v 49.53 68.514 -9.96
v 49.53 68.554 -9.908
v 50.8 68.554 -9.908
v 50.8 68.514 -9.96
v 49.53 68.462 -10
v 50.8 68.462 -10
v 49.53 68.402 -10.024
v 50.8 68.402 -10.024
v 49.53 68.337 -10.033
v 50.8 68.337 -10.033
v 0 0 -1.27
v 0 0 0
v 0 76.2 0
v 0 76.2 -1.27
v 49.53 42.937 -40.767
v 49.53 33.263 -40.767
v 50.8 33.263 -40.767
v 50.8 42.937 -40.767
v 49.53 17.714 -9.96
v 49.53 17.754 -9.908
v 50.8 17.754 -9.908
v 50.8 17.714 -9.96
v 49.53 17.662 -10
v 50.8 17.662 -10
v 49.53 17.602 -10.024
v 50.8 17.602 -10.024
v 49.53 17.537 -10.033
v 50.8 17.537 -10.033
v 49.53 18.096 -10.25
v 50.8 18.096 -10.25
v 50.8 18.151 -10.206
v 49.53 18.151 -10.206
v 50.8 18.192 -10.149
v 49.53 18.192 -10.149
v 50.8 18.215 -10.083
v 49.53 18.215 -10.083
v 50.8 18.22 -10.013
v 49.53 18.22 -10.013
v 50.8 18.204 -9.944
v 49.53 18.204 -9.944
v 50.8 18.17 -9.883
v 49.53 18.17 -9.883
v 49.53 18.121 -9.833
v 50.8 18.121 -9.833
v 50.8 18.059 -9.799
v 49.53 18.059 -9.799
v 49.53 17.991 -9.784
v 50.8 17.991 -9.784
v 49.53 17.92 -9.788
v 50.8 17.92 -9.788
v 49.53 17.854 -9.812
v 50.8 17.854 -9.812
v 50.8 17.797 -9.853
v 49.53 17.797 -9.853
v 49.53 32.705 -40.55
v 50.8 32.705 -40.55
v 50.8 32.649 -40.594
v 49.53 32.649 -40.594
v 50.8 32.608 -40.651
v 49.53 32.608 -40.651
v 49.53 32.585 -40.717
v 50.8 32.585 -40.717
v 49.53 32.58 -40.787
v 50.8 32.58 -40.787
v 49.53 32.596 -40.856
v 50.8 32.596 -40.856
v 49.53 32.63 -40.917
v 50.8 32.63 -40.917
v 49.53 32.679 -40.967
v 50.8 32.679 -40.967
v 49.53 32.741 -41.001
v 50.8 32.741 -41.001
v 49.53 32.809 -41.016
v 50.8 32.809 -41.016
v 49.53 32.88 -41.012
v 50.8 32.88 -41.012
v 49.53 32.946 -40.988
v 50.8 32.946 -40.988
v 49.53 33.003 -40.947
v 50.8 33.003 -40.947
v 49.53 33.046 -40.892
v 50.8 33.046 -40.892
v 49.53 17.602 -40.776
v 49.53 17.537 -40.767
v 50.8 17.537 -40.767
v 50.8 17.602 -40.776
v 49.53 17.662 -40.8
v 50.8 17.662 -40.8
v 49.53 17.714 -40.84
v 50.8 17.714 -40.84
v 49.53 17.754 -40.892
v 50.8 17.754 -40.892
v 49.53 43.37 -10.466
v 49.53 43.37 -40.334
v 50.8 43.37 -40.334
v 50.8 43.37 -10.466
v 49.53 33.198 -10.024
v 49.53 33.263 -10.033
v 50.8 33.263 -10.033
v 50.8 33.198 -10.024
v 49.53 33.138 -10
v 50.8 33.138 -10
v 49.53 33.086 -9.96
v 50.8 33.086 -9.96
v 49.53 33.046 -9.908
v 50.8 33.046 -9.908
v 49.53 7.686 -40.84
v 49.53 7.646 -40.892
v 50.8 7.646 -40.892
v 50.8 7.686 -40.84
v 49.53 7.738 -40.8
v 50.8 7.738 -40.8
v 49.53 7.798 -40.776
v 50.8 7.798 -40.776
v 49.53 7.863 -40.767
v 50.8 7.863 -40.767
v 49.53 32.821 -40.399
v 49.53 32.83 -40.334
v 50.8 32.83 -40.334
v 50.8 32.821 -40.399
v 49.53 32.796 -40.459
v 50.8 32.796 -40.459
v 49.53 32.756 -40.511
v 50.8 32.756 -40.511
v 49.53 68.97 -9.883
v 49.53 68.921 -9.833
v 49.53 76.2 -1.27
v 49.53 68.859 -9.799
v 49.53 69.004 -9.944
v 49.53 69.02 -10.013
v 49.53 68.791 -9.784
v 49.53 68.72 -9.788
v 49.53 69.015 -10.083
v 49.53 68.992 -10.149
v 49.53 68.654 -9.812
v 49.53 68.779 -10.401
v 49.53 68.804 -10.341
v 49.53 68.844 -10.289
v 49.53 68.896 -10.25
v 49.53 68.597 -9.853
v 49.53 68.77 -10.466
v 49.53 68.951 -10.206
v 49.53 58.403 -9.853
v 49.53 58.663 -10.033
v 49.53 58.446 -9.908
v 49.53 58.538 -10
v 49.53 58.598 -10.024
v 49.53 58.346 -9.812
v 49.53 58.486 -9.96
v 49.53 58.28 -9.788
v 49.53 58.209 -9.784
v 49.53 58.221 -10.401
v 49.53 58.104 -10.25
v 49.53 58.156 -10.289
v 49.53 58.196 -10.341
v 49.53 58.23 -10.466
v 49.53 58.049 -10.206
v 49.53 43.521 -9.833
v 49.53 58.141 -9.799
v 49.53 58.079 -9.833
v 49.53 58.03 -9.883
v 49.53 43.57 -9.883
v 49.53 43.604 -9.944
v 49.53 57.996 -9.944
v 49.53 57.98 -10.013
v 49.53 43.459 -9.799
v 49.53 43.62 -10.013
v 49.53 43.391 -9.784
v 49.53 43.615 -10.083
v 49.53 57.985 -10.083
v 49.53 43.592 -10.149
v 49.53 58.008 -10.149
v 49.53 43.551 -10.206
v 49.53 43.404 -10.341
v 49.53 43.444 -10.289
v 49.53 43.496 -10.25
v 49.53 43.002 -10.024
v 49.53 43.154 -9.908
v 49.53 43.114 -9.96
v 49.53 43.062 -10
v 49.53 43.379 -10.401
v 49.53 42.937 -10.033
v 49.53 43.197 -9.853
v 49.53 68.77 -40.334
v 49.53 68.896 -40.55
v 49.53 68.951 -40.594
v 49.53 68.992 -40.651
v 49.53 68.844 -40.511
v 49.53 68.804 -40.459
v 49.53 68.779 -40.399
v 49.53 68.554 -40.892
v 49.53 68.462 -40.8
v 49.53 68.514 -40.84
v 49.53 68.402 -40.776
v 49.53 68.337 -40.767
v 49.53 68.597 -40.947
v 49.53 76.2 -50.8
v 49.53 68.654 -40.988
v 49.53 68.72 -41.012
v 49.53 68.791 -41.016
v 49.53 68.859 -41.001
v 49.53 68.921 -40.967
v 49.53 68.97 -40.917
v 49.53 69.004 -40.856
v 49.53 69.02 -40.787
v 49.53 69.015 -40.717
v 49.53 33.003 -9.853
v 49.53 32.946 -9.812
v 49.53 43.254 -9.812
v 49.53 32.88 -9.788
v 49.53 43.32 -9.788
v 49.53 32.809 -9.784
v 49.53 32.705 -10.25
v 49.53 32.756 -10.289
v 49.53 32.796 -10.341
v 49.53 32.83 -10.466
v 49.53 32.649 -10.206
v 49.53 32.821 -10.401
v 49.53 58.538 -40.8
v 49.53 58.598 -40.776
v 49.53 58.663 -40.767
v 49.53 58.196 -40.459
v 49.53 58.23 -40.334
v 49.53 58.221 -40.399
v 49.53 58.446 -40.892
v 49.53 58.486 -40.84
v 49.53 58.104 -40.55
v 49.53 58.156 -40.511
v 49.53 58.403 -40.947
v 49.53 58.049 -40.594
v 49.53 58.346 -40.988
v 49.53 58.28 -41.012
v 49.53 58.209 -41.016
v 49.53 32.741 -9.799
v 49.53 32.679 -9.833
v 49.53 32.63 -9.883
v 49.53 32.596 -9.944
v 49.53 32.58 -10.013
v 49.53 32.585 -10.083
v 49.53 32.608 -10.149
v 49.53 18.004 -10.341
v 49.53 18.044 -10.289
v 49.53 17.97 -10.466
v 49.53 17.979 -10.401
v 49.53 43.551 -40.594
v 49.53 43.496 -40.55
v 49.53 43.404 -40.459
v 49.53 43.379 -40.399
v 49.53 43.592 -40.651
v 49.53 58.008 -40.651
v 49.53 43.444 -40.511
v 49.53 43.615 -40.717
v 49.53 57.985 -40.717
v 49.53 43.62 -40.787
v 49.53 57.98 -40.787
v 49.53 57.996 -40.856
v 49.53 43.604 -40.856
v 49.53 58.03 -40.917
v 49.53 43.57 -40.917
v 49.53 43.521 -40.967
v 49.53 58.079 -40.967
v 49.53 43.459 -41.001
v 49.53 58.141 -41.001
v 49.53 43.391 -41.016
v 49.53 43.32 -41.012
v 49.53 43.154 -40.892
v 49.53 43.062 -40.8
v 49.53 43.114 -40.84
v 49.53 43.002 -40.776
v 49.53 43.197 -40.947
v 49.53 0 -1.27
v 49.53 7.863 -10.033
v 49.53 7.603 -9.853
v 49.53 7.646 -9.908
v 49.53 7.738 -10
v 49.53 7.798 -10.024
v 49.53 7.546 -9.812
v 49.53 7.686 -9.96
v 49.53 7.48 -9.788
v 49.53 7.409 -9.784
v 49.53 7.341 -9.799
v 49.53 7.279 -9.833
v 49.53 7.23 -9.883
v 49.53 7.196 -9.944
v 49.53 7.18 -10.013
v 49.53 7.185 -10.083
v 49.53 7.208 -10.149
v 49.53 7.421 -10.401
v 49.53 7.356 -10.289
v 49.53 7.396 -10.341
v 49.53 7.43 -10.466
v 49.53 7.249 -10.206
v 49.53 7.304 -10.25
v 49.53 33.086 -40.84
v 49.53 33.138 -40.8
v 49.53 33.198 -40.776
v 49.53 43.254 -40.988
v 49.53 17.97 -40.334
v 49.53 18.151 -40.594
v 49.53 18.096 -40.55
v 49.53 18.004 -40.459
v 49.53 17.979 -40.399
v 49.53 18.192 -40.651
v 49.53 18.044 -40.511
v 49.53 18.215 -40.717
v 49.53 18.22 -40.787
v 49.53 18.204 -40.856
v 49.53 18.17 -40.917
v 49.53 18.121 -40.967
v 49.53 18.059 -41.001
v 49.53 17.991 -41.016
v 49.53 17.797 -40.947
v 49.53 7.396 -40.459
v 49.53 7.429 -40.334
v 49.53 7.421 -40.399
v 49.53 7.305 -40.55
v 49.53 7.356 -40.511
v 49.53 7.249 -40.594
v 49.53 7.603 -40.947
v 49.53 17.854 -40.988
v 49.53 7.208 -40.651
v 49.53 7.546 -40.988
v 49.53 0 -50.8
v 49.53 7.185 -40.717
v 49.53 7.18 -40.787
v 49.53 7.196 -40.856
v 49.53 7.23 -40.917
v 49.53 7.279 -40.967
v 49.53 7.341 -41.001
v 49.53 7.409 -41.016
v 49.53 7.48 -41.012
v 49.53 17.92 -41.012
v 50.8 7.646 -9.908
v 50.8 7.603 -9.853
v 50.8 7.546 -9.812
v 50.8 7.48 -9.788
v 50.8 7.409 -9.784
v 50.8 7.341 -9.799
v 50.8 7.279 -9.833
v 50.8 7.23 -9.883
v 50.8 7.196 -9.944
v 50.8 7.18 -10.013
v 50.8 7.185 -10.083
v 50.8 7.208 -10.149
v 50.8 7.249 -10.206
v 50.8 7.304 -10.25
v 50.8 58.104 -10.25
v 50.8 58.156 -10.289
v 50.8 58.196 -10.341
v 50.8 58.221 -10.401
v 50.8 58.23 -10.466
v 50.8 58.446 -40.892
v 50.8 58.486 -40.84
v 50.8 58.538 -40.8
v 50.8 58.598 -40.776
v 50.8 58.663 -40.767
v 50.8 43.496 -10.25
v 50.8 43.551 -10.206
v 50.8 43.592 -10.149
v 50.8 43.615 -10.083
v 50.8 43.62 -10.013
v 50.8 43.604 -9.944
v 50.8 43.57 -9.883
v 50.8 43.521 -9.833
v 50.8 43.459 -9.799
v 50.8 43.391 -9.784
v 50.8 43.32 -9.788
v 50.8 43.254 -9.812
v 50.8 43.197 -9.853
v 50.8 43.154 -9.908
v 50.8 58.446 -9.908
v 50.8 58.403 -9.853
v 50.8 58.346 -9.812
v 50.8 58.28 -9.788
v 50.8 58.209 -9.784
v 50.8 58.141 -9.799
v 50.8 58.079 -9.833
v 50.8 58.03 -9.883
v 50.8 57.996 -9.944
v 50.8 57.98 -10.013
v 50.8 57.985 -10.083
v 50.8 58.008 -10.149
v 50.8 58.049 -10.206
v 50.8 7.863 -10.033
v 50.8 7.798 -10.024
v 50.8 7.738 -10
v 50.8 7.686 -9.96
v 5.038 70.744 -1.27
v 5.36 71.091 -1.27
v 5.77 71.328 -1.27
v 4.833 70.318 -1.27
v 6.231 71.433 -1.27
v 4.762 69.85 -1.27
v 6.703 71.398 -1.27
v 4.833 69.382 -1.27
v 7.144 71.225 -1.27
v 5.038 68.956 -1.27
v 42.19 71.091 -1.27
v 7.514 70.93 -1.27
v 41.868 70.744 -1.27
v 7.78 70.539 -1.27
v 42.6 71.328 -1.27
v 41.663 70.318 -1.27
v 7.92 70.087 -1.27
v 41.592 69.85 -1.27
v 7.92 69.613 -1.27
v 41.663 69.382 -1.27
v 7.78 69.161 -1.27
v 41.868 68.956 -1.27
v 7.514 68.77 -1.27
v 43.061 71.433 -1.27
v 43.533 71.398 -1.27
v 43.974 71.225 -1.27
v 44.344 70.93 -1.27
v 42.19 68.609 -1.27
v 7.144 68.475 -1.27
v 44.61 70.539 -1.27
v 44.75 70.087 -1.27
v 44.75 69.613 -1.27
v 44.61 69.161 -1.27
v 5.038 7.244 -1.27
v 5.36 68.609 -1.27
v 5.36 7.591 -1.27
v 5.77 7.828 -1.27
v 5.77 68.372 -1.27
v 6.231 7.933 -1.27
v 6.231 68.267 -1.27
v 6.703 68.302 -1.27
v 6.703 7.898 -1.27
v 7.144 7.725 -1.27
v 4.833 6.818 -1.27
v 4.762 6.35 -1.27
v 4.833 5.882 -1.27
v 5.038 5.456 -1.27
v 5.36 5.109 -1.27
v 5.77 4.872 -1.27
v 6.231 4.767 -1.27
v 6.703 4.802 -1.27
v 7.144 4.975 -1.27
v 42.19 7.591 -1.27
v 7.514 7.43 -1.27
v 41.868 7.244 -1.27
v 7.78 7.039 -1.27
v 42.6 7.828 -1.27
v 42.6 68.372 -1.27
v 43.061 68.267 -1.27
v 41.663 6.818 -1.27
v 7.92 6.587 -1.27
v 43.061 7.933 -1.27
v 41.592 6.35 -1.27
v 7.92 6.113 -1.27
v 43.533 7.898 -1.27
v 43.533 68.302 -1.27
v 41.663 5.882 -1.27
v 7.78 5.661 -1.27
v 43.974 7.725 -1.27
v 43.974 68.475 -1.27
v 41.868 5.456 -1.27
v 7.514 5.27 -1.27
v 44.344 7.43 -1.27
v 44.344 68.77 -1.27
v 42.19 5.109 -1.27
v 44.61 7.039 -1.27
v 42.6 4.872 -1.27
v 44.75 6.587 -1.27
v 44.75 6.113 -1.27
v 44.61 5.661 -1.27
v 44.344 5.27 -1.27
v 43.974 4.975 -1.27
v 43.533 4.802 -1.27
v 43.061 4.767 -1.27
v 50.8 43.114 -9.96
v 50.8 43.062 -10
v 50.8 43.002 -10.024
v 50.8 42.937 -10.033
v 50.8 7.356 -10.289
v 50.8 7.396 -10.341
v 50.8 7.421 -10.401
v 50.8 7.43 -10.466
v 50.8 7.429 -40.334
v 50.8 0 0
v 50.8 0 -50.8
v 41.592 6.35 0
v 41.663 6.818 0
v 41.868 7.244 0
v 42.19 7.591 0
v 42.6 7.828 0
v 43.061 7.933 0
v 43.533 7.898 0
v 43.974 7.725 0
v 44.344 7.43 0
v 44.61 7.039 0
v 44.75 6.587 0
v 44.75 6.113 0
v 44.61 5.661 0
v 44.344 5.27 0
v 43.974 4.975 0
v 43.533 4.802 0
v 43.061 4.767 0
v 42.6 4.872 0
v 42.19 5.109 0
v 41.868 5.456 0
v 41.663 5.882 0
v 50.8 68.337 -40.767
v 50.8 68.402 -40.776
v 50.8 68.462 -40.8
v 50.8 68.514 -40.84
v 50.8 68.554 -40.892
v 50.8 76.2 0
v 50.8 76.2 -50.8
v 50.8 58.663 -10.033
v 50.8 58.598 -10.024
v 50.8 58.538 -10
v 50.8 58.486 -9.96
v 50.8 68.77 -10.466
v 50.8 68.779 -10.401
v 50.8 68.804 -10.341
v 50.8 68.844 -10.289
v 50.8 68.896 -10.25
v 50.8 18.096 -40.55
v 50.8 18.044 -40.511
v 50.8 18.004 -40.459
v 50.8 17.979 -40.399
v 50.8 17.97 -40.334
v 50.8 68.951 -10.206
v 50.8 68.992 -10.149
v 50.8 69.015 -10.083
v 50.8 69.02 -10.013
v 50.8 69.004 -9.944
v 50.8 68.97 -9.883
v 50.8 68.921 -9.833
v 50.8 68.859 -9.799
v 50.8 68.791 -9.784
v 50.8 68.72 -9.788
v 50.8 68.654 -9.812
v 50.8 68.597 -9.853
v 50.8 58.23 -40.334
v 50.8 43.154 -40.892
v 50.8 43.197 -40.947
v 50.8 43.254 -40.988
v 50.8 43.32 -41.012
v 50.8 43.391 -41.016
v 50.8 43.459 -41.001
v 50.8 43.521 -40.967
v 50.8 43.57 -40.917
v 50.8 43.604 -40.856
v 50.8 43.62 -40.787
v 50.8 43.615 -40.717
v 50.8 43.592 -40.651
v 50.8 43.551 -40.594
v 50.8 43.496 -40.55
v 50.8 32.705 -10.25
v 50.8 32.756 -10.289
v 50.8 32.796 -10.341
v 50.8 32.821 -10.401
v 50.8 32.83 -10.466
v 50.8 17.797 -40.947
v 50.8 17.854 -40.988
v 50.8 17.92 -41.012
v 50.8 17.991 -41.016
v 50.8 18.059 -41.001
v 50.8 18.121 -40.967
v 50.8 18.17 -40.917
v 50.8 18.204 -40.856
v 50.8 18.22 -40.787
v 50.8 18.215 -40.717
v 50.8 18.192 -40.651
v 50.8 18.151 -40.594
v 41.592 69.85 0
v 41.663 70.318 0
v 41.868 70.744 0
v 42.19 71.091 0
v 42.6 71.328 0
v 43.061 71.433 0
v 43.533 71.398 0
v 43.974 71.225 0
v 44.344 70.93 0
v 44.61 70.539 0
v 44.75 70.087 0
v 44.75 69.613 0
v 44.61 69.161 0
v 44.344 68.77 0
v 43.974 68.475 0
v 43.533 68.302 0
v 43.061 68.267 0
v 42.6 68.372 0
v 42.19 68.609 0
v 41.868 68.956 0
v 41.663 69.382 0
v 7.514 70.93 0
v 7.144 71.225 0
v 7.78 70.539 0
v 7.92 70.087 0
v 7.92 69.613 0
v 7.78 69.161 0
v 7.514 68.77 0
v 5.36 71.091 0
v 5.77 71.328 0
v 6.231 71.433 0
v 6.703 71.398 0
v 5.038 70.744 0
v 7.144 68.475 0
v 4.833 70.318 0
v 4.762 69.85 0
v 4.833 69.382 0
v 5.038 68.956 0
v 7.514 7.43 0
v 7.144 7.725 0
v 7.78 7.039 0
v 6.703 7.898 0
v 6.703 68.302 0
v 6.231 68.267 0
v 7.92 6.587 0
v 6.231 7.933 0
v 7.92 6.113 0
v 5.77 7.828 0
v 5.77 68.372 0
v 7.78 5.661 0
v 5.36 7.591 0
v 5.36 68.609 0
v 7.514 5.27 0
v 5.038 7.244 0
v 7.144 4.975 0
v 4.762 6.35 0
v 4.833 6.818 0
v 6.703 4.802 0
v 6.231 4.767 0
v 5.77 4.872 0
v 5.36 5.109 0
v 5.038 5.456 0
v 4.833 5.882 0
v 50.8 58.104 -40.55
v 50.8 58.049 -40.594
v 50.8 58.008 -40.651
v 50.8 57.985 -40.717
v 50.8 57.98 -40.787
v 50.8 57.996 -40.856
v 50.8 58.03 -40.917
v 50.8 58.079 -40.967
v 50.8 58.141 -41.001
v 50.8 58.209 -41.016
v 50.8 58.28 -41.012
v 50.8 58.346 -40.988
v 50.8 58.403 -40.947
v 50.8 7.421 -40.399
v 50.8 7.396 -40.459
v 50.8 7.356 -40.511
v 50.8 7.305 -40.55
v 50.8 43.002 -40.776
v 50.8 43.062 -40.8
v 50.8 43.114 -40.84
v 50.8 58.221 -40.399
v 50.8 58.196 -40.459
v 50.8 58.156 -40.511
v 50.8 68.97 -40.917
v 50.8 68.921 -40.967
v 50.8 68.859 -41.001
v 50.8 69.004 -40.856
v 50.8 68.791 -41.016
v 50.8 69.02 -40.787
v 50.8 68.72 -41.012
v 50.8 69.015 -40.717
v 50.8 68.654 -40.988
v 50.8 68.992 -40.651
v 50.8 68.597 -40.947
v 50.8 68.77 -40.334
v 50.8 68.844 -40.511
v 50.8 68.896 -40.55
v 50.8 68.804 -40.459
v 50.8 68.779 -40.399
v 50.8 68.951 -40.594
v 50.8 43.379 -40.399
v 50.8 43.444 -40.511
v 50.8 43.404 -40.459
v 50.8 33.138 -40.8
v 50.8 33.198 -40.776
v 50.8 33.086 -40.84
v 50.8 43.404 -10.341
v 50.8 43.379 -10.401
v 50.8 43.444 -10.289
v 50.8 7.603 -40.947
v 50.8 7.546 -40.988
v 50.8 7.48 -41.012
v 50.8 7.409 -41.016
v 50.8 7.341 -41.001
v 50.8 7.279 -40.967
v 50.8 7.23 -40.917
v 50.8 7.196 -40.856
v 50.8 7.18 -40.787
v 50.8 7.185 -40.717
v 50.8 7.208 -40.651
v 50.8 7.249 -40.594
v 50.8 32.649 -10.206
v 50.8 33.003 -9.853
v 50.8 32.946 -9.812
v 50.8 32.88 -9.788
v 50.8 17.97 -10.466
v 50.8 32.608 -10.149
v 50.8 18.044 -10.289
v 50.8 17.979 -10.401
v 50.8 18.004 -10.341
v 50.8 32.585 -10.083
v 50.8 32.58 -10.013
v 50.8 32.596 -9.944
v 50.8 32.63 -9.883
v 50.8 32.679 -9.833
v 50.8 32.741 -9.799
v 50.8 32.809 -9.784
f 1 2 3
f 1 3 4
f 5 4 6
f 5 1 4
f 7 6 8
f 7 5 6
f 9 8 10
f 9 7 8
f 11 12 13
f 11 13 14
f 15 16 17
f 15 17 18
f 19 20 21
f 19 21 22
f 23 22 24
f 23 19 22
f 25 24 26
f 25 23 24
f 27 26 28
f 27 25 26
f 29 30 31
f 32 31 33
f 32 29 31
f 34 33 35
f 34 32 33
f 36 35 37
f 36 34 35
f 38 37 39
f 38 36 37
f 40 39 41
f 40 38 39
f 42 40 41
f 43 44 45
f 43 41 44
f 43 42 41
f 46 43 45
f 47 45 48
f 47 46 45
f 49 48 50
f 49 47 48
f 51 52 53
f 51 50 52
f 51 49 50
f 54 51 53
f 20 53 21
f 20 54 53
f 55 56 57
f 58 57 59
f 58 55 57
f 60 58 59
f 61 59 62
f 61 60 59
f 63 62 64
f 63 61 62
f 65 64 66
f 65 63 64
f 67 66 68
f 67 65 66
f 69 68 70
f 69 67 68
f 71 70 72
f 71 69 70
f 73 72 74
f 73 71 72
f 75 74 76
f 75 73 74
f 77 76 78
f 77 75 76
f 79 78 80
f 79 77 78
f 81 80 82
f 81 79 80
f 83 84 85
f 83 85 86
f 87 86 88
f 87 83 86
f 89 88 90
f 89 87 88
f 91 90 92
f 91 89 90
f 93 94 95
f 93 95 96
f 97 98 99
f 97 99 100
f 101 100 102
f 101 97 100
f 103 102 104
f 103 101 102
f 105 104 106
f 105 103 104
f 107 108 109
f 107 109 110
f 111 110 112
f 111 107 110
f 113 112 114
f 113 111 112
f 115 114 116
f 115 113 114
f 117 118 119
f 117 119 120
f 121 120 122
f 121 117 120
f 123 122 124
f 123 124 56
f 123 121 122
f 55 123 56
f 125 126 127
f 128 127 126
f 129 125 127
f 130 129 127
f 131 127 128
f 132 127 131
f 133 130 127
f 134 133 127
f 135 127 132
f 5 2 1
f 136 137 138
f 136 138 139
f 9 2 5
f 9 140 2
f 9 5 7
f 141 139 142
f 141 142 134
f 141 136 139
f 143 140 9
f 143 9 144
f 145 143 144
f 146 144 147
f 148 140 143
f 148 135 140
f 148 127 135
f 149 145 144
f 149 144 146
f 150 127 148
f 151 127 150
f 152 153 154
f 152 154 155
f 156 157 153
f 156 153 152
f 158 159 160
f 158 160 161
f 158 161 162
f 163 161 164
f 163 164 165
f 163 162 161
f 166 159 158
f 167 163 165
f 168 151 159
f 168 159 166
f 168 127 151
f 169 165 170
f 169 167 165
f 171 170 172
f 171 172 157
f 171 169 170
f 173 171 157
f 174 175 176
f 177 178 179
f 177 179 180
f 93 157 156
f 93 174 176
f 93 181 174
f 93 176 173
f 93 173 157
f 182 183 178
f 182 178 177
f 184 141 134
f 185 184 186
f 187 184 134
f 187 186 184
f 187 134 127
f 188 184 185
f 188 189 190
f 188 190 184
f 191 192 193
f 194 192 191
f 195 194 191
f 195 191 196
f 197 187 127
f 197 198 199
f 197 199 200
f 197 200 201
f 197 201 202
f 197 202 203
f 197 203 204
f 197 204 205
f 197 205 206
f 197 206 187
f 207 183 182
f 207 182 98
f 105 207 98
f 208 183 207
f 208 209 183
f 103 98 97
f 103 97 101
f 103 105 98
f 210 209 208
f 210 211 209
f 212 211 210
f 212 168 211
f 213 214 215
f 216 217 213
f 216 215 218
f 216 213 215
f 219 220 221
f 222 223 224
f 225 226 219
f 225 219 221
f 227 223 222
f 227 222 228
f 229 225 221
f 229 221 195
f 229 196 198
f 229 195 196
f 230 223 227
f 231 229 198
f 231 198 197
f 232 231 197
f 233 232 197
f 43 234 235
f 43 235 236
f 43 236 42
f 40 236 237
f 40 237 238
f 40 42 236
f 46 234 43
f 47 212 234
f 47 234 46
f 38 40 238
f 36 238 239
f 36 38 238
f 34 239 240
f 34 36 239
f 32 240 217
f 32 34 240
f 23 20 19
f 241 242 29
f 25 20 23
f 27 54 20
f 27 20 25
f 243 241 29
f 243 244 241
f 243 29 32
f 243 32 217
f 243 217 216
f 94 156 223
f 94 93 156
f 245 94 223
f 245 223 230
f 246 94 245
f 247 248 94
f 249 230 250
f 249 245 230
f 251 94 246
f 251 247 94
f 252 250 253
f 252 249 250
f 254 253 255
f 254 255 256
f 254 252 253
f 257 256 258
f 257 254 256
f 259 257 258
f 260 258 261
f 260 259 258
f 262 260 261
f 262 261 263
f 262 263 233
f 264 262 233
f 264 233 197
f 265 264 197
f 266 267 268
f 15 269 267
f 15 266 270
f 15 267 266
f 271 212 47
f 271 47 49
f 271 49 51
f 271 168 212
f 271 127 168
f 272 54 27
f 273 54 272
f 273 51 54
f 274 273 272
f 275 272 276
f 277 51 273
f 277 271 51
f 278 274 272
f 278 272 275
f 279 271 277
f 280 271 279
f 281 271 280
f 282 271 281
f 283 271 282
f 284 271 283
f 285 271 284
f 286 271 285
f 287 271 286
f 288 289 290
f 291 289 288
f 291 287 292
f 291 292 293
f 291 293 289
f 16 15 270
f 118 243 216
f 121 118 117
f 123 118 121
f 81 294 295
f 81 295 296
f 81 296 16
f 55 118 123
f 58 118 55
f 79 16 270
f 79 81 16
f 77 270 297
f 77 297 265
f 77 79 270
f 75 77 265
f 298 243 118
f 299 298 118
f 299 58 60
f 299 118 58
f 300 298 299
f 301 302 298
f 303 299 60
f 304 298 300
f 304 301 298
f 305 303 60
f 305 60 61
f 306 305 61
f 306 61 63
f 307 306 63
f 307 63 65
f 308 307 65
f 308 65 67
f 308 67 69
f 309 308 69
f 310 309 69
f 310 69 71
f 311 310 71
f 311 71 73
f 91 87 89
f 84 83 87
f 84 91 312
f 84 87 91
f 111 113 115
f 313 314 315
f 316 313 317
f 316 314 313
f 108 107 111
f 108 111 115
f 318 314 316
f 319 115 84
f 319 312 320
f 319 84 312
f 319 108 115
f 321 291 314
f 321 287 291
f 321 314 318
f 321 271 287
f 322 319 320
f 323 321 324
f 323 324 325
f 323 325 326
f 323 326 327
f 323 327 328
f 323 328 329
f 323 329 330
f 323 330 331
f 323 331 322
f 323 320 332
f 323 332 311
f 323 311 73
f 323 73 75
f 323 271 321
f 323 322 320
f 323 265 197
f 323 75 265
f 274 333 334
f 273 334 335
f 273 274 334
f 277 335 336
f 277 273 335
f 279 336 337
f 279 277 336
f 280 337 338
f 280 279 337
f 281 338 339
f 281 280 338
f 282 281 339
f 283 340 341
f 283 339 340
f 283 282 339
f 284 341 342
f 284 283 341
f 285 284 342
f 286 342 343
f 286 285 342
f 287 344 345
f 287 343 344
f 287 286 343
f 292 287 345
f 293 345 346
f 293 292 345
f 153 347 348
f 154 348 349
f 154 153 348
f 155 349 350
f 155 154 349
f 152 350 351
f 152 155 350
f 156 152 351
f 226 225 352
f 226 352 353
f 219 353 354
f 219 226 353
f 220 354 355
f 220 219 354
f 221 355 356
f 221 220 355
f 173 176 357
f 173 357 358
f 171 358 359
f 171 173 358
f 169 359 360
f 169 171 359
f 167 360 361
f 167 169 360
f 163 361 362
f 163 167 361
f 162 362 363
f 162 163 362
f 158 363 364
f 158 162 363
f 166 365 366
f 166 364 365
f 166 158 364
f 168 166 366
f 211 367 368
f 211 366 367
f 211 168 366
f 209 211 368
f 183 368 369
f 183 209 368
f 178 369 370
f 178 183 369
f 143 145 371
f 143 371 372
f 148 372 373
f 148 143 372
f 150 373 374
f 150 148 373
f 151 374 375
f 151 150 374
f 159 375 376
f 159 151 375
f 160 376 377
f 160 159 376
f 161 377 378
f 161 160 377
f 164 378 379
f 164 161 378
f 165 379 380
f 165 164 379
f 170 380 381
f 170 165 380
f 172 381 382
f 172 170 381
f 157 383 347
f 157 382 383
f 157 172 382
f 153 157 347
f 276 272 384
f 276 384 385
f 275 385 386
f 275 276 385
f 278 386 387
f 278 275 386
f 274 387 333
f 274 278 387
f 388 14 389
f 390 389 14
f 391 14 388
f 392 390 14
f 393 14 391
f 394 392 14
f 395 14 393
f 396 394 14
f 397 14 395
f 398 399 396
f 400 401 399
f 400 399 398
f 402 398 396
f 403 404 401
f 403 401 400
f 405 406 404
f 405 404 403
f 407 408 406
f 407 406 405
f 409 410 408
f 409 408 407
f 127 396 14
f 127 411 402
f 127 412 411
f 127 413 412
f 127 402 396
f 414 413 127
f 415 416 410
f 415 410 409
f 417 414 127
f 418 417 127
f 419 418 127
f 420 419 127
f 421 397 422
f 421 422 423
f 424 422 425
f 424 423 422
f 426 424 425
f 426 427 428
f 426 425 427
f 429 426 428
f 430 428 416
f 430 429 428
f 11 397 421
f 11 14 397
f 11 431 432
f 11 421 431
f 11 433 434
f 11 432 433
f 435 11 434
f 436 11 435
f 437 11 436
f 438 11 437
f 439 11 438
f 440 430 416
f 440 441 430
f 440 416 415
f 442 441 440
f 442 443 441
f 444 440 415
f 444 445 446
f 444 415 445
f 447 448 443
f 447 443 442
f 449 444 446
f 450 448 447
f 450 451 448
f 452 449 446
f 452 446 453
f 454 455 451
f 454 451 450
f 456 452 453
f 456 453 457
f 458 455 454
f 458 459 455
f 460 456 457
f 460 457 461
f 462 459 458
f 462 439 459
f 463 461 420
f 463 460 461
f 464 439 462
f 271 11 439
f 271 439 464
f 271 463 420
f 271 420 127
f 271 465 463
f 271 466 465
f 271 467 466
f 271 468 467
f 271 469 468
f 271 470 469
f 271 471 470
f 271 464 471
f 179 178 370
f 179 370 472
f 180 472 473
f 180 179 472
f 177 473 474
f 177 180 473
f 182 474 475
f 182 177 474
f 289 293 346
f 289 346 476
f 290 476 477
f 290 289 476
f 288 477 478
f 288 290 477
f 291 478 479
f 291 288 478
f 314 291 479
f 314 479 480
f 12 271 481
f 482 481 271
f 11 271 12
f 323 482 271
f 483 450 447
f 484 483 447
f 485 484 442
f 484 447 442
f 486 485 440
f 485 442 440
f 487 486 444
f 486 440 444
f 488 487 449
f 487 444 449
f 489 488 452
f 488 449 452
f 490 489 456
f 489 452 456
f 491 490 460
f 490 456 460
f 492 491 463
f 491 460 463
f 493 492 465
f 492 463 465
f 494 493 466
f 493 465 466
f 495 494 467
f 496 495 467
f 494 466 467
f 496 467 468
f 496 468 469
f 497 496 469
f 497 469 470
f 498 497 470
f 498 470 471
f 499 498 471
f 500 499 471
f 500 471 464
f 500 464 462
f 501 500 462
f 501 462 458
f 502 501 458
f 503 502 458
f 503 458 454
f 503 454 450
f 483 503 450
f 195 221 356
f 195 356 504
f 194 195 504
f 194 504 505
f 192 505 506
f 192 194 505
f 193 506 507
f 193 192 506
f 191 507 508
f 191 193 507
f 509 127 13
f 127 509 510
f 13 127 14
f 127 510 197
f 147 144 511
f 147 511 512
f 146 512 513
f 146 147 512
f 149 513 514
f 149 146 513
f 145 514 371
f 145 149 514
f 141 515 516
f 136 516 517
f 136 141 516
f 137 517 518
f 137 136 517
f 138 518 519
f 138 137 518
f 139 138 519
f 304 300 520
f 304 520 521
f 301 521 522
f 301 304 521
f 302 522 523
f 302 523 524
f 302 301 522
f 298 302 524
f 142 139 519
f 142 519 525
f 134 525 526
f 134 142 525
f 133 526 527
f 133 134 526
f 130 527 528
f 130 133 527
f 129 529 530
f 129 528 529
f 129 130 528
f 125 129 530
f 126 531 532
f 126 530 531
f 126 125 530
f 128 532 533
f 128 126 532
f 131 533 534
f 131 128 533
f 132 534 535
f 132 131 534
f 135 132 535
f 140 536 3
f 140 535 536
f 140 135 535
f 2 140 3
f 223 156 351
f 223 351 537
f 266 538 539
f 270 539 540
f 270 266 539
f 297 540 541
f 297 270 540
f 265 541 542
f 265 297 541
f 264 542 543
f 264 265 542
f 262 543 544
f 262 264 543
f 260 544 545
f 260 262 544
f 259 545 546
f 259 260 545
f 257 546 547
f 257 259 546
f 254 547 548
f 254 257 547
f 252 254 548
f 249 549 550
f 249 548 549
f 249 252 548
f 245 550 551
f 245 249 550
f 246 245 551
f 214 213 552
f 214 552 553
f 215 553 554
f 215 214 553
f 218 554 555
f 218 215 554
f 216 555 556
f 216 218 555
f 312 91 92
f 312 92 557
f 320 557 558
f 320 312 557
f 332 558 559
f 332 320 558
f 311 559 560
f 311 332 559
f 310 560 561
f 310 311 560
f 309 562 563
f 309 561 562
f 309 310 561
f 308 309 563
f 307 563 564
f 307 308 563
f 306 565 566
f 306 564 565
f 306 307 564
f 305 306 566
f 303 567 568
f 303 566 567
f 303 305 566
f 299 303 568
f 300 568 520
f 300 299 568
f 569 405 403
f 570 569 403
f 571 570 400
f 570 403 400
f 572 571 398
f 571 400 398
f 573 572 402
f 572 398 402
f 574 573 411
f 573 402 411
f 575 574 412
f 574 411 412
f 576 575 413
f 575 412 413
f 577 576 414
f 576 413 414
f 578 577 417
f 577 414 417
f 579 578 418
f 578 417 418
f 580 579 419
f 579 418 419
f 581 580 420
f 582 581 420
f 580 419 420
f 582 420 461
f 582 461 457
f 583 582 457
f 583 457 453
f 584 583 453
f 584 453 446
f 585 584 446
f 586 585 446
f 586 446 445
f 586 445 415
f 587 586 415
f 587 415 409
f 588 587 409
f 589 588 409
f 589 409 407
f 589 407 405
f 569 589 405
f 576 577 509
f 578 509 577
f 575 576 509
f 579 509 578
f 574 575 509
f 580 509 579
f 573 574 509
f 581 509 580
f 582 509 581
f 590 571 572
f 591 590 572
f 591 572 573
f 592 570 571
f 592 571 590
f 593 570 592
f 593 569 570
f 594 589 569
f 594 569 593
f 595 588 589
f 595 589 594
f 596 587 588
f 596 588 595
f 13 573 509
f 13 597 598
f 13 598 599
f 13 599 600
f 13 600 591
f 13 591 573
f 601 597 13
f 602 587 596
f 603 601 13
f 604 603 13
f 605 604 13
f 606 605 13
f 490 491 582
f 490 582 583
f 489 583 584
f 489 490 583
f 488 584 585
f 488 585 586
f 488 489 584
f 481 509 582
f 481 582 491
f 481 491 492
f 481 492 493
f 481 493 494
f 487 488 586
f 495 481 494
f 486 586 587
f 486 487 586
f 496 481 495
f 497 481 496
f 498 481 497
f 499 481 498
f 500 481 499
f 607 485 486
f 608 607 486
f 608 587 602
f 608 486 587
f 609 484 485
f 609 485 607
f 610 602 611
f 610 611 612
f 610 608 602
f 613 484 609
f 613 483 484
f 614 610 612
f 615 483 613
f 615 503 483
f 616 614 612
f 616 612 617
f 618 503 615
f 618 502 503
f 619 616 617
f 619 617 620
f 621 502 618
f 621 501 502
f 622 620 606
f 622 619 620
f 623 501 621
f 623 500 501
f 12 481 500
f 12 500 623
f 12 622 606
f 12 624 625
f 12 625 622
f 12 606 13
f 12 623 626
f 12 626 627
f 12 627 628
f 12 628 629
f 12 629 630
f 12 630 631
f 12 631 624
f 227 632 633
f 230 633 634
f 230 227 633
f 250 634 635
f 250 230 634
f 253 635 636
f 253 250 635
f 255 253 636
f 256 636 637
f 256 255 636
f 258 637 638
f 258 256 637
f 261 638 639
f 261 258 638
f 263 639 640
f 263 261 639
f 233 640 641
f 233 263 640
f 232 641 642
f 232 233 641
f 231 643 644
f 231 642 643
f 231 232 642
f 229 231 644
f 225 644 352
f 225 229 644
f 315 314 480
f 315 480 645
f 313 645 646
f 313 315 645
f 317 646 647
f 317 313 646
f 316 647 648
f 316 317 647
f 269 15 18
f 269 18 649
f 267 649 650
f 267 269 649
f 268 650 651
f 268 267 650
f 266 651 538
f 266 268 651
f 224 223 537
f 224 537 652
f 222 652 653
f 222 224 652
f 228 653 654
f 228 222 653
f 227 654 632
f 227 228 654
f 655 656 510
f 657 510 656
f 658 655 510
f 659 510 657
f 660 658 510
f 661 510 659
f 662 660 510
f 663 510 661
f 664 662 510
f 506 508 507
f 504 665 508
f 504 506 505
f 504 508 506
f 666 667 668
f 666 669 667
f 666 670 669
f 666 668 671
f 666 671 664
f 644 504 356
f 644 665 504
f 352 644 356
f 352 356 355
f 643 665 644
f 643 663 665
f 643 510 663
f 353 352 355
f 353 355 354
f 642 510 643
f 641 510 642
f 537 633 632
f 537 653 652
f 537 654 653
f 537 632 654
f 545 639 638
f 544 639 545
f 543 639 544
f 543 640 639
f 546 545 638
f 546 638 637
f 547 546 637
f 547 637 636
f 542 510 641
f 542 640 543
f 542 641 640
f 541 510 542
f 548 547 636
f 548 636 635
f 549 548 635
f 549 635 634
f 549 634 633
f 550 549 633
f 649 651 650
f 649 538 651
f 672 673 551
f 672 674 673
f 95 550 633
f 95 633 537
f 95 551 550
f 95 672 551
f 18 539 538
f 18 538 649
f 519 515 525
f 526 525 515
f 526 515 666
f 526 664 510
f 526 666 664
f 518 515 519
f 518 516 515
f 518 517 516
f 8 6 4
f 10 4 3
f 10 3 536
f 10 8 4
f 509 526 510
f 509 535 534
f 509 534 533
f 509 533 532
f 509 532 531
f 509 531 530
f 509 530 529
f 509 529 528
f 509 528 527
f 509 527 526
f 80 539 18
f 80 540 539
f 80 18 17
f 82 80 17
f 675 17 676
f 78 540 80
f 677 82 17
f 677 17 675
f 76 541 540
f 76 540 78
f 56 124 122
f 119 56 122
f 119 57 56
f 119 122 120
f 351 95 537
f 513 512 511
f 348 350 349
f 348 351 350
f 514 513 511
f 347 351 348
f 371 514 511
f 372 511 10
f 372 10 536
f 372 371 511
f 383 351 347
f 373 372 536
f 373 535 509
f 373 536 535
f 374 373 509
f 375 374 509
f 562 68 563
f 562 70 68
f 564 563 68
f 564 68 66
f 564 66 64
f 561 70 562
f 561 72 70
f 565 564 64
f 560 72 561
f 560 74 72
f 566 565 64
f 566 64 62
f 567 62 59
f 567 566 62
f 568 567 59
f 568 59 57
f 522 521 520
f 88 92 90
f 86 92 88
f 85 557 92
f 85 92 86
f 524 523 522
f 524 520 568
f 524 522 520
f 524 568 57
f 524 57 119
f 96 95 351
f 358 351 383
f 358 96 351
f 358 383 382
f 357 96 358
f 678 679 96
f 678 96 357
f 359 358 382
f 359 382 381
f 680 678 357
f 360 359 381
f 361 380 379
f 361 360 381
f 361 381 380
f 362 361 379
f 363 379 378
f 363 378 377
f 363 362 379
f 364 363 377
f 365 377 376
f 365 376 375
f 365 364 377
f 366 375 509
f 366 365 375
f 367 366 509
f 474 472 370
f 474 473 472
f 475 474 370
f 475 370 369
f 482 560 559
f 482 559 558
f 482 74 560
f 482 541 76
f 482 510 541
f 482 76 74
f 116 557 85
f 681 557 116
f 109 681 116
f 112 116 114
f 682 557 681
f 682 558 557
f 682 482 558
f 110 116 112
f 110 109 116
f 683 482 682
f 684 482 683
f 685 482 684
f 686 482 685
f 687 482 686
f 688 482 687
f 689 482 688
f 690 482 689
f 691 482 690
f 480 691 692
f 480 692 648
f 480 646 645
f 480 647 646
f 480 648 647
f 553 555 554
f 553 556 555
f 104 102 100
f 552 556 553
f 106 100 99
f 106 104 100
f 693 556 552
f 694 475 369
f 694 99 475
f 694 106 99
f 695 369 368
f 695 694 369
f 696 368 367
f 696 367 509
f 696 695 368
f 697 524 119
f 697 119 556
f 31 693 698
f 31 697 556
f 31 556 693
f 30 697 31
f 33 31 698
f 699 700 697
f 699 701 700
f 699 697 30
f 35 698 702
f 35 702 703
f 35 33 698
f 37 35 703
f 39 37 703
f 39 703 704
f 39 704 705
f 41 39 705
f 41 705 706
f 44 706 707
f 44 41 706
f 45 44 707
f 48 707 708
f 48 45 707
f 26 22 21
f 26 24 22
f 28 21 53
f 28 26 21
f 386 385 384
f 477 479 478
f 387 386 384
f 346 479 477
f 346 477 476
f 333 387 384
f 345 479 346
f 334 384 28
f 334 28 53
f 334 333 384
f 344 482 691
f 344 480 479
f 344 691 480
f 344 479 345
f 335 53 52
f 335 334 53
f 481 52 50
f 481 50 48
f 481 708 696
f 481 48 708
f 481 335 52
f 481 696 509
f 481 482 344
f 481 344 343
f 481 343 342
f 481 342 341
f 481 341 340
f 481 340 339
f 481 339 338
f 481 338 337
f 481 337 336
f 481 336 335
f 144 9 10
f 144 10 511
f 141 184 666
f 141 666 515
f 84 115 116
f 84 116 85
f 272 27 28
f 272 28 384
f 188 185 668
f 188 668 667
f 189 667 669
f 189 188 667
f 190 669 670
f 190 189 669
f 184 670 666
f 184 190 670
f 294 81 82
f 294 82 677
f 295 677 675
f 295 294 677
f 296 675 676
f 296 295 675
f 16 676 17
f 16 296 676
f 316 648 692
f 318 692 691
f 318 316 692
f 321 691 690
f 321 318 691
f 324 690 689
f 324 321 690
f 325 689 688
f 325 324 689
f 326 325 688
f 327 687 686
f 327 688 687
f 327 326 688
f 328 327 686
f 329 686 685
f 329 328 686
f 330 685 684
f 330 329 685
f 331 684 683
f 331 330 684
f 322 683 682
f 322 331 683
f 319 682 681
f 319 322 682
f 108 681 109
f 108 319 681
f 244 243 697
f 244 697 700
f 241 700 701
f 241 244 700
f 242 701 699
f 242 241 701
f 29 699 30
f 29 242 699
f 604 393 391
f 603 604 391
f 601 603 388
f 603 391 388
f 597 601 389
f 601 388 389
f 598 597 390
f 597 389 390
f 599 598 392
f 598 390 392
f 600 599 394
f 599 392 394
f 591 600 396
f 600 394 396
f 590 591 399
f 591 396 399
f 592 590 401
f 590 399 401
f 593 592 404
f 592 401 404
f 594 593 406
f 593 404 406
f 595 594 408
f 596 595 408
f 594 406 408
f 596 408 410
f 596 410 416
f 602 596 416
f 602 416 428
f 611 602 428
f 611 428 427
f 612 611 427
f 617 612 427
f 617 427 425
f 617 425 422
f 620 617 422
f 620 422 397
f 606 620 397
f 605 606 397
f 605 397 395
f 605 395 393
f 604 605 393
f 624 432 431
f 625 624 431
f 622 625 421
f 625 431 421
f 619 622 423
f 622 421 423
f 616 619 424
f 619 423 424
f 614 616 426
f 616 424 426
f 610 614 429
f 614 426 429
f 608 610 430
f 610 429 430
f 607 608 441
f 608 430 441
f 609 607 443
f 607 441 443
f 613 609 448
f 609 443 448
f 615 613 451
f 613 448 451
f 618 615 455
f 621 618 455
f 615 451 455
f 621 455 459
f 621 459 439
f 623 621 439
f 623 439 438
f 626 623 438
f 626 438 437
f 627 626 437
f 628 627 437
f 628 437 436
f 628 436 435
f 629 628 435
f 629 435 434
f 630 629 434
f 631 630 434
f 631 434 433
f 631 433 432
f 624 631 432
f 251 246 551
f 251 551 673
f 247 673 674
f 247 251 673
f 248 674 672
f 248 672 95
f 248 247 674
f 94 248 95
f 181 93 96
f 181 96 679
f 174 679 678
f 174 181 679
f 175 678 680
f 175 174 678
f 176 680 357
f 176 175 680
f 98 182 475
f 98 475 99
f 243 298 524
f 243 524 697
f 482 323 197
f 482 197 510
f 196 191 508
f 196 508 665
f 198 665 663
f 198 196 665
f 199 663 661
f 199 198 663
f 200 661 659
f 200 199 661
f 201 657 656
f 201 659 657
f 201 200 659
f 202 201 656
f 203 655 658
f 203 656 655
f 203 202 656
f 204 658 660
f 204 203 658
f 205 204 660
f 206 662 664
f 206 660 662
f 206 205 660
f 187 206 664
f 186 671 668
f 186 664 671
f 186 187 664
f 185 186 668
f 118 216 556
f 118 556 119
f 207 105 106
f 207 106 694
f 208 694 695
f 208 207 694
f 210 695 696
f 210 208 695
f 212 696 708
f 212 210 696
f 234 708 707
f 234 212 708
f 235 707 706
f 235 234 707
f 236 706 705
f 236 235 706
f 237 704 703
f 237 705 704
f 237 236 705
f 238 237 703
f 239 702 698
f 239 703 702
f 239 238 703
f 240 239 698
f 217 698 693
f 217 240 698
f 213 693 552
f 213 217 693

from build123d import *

# Parameters (mm, degrees)
BOSS_EXTRUDE1_DEPTH = 76.2
CUT_EXTRUDE1_DEPTH  = 105.116765701
SKETCH3_R           = 1.5875
CUT_EXTRUDE2_DEPTH  = 105.116765701


with BuildPart() as part:
    # Sketch1 → Boss-Extrude1 (new body)
    with BuildSketch(Plane(origin=(0, 0, 0), x_dir=(1, 0, 0), z_dir=(0, 1, 0))):
        Polygon((0, 0), (0, 1.27), (49.53, 1.27), (49.53, 50.8), (50.8, 50.8), (50.8, 0), align=None)
    extrude(amount=BOSS_EXTRUDE1_DEPTH)

    # Sketch2 → Cut-Extrude1 (cut, through all)
    with BuildSketch(Plane.ZY.offset(-49.53)):
        with BuildLine():
            ThreePointArc((-9.908, 58.446006351), (-9.856223305, 58.052723305), (-10.249506351, 58.1045))
            ThreePointArc((-10.249506351, 58.1045), (-10.341012702, 58.196006351), (-10.466012702, 58.2295))
            Line((-10.466012702, 58.2295), (-40.333987298, 58.2295))
            ThreePointArc((-40.333987298, 58.2295), (-40.458987298, 58.196006351), (-40.550493649, 58.1045))
            ThreePointArc((-40.550493649, 58.1045), (-40.943776695, 58.052723305), (-40.892, 58.446006351))
            ThreePointArc((-40.892, 58.446006351), (-40.800493649, 58.537512702), (-40.767, 58.662512702))
            Line((-40.767, 58.662512702), (-40.767, 68.337487298))
            ThreePointArc((-40.767, 68.337487298), (-40.800493649, 68.462487298), (-40.892, 68.553993649))
            ThreePointArc((-40.892, 68.553993649), (-40.943776695, 68.947276695), (-40.550493649, 68.8955))
            ThreePointArc((-40.550493649, 68.8955), (-40.458987298, 68.803993649), (-40.333987298, 68.7705))
            Line((-40.333987298, 68.7705), (-10.466012702, 68.7705))
            ThreePointArc((-10.466012702, 68.7705), (-10.341012702, 68.803993649), (-10.249506351, 68.8955))
            ThreePointArc((-10.249506351, 68.8955), (-9.856223305, 68.947276695), (-9.908, 68.553993649))
            ThreePointArc((-9.908, 68.553993649), (-9.999506351, 68.462487298), (-10.033, 68.337487298))
            Line((-10.033, 68.337487298), (-10.033, 58.662512702))
            ThreePointArc((-10.033, 58.662512702), (-9.999506351, 58.537512702), (-9.908, 58.446006351))
        make_face()
        with BuildLine():
            ThreePointArc((-9.908, 33.046006351), (-9.856223305, 32.652723305), (-10.249506351, 32.7045))
            ThreePointArc((-10.249506351, 32.7045), (-10.341012702, 32.796006351), (-10.466012702, 32.8295))
            Line((-10.466012702, 32.8295), (-40.333987298, 32.8295))
            ThreePointArc((-40.333987298, 32.8295), (-40.458987298, 32.796006351), (-40.550493649, 32.7045))
            ThreePointArc((-40.550493649, 32.7045), (-40.943776695, 32.652723305), (-40.892, 33.046006351))
            ThreePointArc((-40.892, 33.046006351), (-40.800493649, 33.137512702), (-40.767, 33.262512702))
            Line((-40.767, 33.262512702), (-40.767, 42.937487298))
            ThreePointArc((-40.767, 42.937487298), (-40.800493649, 43.062487298), (-40.892, 43.153993649))
            ThreePointArc((-40.892, 43.153993649), (-40.943776695, 43.547276695), (-40.550493649, 43.4955))
            ThreePointArc((-40.550493649, 43.4955), (-40.458987298, 43.403993649), (-40.333987298, 43.3705))
            Line((-40.333987298, 43.3705), (-10.466012702, 43.3705))
            ThreePointArc((-10.466012702, 43.3705), (-10.341012702, 43.403993649), (-10.249506351, 43.4955))
            ThreePointArc((-10.249506351, 43.4955), (-9.856223305, 43.547276695), (-9.908, 43.153993649))
            ThreePointArc((-9.908, 43.153993649), (-9.999506351, 43.062487298), (-10.033, 42.937487298))
            Line((-10.033, 42.937487298), (-10.033, 33.262512702))
            ThreePointArc((-10.033, 33.262512702), (-9.999506351, 33.137512702), (-9.908, 33.046006351))
        make_face()
        with BuildLine():
            ThreePointArc((-9.908, 7.646006351), (-9.856223305, 7.252723305), (-10.249506351, 7.3045))
            ThreePointArc((-10.249506351, 7.3045), (-10.341012702, 7.396006351), (-10.466012702, 7.4295))
            Line((-10.466012702, 7.4295), (-40.333987298, 7.4295))
            ThreePointArc((-40.333987298, 7.4295), (-40.458987298, 7.396006351), (-40.550493649, 7.3045))
            ThreePointArc((-40.550493649, 7.3045), (-40.943776695, 7.252723305), (-40.892, 7.646006351))
            ThreePointArc((-40.892, 7.646006351), (-40.800493649, 7.737512702), (-40.767, 7.862512702))
            Line((-40.767, 7.862512702), (-40.767, 17.537487298))
            ThreePointArc((-40.767, 17.537487298), (-40.800493649, 17.662487298), (-40.892, 17.753993649))
            ThreePointArc((-40.892, 17.753993649), (-40.943776695, 18.147276695), (-40.550493649, 18.0955))
            ThreePointArc((-40.550493649, 18.0955), (-40.458987298, 18.003993649), (-40.333987298, 17.9705))
            Line((-40.333987298, 17.9705), (-10.466012702, 17.9705))
            ThreePointArc((-10.466012702, 17.9705), (-10.341012702, 18.003993649), (-10.249506351, 18.0955))
            ThreePointArc((-10.249506351, 18.0955), (-9.856223305, 18.147276695), (-9.908, 17.753993649))
            ThreePointArc((-9.908, 17.753993649), (-9.999506351, 17.662487298), (-10.033, 17.537487298))
            Line((-10.033, 17.537487298), (-10.033, 7.862512702))
            ThreePointArc((-10.033, 7.862512702), (-9.999506351, 7.737512702), (-9.908, 7.646006351))
        make_face()
    extrude(amount=-CUT_EXTRUDE1_DEPTH, mode=Mode.SUBTRACT)

    # Sketch3 → Cut-Extrude2 (cut, through all)
    with BuildSketch(Plane(origin=(0, 0, -1.27), x_dir=(-1, 0, 0), z_dir=(0, 0, -1))):
        with Locations((-6.35, 69.85)):
            Circle(SKETCH3_R)
        with Locations((-6.35, 6.35)):
            Circle(SKETCH3_R)
        with Locations((-43.18, 6.35)):
            Circle(SKETCH3_R)
        with Locations((-43.18, 69.85)):
            Circle(SKETCH3_R)
    extrude(amount=-CUT_EXTRUDE2_DEPTH, mode=Mode.SUBTRACT)


solid = part.part
